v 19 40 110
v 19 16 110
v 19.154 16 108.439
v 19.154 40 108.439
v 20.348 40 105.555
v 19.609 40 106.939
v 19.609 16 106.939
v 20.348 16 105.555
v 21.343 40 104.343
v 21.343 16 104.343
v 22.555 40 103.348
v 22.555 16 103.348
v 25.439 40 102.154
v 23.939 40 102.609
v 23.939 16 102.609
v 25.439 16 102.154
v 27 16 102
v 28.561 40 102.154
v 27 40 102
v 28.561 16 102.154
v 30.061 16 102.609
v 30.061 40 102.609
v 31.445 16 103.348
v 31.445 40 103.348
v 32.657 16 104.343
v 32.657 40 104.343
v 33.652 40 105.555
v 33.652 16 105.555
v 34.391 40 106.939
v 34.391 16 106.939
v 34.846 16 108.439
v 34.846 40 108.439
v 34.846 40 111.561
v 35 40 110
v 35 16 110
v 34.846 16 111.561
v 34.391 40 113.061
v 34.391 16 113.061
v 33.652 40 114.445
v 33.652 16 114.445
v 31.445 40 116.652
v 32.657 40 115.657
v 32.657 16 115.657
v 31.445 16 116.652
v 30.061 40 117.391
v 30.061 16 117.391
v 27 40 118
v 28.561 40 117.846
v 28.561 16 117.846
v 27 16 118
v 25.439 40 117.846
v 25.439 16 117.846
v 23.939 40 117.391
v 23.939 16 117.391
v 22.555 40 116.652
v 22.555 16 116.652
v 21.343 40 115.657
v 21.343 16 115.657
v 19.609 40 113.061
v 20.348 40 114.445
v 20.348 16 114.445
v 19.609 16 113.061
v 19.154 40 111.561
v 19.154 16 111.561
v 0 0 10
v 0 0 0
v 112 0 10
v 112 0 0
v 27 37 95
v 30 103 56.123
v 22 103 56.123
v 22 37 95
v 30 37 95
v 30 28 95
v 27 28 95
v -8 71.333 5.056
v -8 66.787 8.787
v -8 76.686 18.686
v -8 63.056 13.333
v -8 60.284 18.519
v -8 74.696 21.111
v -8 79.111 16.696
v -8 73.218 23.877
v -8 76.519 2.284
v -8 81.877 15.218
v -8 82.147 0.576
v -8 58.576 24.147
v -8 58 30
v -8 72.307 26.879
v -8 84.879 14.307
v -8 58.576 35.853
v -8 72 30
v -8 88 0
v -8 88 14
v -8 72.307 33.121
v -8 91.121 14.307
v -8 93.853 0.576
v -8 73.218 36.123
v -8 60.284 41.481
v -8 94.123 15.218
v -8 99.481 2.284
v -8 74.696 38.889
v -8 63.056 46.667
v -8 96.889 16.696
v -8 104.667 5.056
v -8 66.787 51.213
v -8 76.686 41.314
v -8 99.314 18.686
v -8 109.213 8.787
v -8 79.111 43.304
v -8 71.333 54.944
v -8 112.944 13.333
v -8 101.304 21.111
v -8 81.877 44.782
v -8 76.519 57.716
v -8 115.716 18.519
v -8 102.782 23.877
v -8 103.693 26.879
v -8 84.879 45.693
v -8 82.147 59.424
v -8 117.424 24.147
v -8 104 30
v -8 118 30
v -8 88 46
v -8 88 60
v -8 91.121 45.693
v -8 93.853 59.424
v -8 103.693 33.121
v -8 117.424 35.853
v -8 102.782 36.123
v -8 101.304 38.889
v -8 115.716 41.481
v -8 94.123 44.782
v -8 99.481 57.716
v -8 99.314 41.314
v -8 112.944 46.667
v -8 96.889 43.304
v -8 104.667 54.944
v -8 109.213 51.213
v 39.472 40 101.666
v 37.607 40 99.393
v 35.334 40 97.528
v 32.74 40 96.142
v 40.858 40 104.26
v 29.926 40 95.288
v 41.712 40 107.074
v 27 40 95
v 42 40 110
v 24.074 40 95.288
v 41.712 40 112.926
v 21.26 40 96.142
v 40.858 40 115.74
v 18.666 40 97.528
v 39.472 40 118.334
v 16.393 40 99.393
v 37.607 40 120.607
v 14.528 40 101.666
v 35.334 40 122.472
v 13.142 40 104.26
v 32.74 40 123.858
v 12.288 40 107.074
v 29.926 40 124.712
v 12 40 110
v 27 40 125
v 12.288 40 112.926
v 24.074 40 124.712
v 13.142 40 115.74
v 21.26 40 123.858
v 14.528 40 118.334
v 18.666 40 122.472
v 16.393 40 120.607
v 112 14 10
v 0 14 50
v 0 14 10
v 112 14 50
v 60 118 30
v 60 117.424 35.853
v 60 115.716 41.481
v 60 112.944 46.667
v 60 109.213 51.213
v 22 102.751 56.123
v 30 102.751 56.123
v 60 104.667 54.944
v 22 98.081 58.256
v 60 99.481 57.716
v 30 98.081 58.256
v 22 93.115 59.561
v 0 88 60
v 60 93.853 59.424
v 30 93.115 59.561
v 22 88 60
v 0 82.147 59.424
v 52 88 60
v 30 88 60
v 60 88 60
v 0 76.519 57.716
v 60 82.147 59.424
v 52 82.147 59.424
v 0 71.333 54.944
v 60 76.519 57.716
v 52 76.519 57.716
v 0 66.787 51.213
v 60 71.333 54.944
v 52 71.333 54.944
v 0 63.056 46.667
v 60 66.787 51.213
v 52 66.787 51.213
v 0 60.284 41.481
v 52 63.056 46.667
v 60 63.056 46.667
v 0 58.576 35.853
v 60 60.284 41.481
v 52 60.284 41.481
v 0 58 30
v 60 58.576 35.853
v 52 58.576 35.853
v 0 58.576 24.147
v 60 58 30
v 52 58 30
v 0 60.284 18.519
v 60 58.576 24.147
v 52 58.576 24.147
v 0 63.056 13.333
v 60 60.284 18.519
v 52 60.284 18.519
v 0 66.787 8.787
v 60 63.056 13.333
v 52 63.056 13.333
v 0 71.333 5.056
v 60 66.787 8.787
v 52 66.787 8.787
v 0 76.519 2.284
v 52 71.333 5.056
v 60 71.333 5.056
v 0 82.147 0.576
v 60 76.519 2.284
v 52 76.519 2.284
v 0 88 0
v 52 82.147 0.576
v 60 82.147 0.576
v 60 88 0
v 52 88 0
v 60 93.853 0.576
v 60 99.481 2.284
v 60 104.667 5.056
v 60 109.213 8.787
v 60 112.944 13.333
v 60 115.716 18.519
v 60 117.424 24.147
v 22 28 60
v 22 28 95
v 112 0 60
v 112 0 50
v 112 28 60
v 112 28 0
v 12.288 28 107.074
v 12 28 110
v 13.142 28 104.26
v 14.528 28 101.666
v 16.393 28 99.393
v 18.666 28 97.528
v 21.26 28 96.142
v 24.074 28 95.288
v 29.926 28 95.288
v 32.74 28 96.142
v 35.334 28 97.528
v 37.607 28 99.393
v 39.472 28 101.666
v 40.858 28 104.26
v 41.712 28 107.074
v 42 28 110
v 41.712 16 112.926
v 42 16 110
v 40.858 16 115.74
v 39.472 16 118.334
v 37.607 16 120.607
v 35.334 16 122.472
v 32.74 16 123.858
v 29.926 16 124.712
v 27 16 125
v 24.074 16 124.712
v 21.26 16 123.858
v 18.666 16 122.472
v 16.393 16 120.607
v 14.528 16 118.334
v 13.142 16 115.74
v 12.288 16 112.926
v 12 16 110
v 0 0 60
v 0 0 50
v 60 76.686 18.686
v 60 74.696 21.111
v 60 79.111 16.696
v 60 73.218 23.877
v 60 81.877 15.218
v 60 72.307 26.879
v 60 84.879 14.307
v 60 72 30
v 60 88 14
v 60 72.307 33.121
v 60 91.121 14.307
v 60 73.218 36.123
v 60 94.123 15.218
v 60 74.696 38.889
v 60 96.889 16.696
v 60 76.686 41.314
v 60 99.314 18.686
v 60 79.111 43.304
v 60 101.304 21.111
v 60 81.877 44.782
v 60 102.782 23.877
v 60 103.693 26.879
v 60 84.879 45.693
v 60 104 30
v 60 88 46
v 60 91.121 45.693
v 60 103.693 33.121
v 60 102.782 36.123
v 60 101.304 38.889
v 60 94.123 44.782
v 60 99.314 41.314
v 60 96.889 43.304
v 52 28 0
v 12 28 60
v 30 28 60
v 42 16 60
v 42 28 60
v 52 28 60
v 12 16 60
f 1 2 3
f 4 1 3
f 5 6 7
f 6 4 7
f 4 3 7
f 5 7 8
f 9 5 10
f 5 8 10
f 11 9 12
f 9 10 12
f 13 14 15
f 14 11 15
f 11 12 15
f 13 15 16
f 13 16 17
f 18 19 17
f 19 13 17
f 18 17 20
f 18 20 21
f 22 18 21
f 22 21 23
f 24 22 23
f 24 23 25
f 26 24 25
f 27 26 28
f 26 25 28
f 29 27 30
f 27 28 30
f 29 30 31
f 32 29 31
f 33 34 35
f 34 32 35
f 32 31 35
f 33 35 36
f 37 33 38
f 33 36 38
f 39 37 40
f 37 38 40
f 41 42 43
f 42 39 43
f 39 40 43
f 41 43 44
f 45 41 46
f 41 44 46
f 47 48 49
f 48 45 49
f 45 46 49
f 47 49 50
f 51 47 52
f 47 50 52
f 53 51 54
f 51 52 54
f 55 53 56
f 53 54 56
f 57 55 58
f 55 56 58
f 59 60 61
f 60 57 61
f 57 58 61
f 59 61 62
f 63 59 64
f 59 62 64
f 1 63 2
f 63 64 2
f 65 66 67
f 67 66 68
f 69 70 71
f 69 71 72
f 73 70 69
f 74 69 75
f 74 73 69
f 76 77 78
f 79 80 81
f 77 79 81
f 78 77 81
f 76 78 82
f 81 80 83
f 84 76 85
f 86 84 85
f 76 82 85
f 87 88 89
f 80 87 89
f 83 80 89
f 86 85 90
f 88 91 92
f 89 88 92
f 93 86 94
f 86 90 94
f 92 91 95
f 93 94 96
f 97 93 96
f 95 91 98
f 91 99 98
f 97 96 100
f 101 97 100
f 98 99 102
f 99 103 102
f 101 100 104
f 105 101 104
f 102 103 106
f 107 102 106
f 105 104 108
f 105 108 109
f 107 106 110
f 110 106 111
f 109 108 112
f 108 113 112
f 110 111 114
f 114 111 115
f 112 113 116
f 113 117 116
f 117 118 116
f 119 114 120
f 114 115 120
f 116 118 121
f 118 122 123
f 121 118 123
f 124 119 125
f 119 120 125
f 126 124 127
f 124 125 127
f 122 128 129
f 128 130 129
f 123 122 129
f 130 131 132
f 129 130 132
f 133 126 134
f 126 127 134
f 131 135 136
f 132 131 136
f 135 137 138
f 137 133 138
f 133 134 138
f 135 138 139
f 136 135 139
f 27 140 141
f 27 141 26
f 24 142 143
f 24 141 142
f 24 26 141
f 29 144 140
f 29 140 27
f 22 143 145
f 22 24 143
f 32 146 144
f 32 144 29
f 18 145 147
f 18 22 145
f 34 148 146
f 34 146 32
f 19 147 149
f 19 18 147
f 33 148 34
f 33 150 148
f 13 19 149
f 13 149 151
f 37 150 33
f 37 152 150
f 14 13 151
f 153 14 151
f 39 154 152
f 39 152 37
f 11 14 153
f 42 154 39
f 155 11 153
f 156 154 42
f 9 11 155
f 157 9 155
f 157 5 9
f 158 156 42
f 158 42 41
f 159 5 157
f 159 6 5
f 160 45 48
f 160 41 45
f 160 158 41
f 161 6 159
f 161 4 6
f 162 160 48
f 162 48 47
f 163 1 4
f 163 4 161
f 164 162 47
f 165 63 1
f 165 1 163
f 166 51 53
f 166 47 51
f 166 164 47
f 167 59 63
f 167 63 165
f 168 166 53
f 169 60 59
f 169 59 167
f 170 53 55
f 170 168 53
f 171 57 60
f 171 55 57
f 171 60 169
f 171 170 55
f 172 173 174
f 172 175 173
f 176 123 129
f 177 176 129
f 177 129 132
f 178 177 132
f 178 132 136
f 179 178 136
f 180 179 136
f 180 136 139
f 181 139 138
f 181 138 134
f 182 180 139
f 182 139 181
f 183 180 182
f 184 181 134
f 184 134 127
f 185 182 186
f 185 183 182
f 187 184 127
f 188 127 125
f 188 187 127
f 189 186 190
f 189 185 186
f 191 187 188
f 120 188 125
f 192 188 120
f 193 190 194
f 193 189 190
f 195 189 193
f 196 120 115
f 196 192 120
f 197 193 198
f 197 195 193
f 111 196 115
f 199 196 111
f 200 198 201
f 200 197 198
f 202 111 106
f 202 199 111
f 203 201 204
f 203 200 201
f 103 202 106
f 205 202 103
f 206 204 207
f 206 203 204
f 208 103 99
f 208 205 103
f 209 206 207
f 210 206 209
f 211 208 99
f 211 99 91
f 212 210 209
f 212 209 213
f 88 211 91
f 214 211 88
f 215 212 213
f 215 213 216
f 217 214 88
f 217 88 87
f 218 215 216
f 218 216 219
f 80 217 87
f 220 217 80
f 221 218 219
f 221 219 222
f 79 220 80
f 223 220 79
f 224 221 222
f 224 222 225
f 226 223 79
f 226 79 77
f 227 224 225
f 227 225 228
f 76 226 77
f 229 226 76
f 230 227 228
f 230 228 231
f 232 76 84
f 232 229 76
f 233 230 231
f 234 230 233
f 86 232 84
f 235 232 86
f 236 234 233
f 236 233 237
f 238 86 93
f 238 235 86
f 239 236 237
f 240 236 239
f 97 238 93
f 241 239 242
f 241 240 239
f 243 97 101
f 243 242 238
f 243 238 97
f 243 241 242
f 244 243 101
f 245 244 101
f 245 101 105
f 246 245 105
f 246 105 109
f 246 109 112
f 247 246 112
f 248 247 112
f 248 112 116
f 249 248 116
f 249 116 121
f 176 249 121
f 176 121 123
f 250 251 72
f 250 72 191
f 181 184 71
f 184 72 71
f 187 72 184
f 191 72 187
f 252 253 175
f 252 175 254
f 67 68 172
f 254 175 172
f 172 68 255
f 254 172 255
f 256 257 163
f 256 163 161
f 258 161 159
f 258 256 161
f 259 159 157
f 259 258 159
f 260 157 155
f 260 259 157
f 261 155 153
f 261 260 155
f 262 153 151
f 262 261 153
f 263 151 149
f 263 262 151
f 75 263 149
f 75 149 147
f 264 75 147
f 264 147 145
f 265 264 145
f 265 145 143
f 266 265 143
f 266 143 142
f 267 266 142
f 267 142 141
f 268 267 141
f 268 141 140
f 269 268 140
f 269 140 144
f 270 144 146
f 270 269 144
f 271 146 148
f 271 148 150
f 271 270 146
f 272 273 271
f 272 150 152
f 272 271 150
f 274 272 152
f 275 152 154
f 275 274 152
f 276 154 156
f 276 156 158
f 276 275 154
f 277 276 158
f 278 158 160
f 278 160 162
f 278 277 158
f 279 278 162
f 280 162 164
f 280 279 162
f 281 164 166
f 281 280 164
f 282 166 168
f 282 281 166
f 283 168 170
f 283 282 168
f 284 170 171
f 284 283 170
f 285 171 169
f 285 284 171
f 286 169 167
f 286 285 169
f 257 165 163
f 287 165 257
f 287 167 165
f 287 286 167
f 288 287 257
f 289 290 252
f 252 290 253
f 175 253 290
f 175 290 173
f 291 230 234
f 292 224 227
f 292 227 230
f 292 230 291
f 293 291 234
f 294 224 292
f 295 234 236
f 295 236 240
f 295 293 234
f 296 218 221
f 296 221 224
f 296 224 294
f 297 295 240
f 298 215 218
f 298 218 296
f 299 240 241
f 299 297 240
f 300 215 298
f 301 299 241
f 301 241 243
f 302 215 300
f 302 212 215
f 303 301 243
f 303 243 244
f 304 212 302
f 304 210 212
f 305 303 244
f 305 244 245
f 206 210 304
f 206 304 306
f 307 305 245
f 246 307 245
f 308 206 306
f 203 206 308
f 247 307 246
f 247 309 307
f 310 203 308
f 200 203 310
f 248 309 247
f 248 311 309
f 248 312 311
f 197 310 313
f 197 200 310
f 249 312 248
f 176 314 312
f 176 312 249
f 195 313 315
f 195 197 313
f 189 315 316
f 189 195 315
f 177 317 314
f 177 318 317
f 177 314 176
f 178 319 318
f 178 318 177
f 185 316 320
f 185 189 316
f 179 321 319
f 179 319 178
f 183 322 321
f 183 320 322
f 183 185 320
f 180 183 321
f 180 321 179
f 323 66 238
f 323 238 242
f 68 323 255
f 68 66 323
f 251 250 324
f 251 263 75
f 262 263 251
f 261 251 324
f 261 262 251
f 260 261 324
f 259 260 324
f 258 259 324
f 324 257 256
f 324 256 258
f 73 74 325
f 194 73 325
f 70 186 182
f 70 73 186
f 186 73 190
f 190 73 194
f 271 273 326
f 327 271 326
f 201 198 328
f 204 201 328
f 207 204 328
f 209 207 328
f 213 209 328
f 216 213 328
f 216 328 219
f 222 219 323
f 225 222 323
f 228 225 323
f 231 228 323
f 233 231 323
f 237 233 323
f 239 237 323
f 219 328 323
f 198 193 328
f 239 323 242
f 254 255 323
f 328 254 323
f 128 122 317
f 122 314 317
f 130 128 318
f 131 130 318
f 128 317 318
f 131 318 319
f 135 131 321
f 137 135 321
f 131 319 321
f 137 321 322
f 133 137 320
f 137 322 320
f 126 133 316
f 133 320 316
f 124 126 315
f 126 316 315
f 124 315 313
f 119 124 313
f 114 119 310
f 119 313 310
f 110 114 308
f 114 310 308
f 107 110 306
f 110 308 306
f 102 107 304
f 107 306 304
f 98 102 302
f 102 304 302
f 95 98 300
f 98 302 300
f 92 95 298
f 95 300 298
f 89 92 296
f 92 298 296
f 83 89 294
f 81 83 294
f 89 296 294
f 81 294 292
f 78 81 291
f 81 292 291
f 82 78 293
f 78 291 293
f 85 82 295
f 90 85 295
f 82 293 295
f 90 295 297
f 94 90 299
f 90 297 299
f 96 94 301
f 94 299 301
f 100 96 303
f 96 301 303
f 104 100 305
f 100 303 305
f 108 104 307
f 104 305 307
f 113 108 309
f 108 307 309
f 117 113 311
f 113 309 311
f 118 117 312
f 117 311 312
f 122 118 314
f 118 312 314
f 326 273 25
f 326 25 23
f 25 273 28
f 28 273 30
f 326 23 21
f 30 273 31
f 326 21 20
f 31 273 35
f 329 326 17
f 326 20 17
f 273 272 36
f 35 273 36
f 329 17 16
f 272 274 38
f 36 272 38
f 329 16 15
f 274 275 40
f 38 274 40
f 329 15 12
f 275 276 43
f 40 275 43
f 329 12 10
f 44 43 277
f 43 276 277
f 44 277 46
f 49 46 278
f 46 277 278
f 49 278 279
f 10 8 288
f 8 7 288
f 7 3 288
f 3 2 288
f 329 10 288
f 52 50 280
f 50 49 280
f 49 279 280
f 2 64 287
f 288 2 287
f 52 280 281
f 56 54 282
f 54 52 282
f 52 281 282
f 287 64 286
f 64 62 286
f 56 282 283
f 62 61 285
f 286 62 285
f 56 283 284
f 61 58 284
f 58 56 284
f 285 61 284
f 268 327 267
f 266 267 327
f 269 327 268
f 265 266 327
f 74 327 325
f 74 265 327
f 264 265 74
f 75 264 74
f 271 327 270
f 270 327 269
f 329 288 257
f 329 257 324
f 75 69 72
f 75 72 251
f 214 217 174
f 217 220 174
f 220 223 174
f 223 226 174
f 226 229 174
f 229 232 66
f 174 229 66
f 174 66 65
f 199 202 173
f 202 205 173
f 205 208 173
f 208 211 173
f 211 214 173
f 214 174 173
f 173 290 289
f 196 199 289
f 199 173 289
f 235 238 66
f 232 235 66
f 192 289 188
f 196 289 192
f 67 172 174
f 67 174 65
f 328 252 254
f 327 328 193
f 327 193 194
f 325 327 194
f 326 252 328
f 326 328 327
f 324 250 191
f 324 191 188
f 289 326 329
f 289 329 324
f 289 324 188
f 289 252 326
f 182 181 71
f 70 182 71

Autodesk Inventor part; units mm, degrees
sketch "Skizze1" plane through (0, 0, 0) normal (0, 0, 1) x (1, 0, 0)
  line L0 (0, 0) -> (112, 0)
  line L1 (112, 0) -> (112, 28)
  line L2 (112, 28) -> (0, 28)
  line L3 (0, 28) -> (0, 0)
  dimension "d0" = 28
  dimension "d1" = 112
extrude "Extrusion1" add sketch "Skizze1" along normal blind 60
sketch "Skizze2" plane through (112, 0, 0) normal (1, 0, 0) x (0, 0, -1)
  line L0 (0, 0) -> (-60, 0) projected
  line L1 (-50, 0) -> (-50, 14)
  line L2 (-50, 14) -> (-10, 14)
  line L3 (-10, 14) -> (-10, 0)
  line L4 (-60, 0) -> (-60, 28) projected
  line L5 (0, 28) -> (-60, 28) projected
  point P0 (-10, 7)
  point P1 (-50, 7)
  point P2 (-30, 14)
  dimension "d4" = 40
  dimension "d5" = 10
  dimension "d6" = 14
extrude "Extrusion2" cut sketch "Skizze2" against normal up to surface (112 mm away)
sketch "Skizze3" plane through (0, 28, 0) normal (0, 1, 0) x (1, 0, 0)
  line L0 (112, -60) -> (0, -60) projected
  line L1 (0, 0) -> (112, 0) projected
  line L2 (0, -60) -> (52, -60)
  line L3 (52, -60) -> (52, 0)
  line L4 (52, 0) -> (0, 0)
  line L5 (0, 0) -> (0, -60)
  line L6 (112, 0) -> (112, -60) projected
  point P0 (52, -30)
  dimension "d9" = 60
extrude "Extrusion3" add sketch "Skizze3" along normal blind 60 contours L0 L5 L1 L3
ref_plane "Arbeitsebene1" through (60, 0, 0) normal (1, 0, 0) x (0, 1, 0)
sketch "Skizze7" plane through (60, 0, 0) normal (1, 0, 0) x (0, 1, 0)
  circle A0 centre (88, 30) radius 30
  circle A1 centre (88, 30) radius 16
  line L0 (28, 0) -> (28, 60) projected
  point P0 (0, 0)
  point P1 (28, 30)
  point P2 (28, 30)
  dimension "d25" = 60
  dimension "d26" = 32
  dimension "d27" = 60
extrude "Extrusion6" add sketch "Skizze7" against normal blind 68
extrude "Extrusion7" cut sketch "Skizze7" against normal blind 68 contours A1
ref_plane "Arbeitsebene2" through (0, 16, 0) normal (0, 1, 0) x (-1, 0, 0)
sketch "Skizze11" plane through (0, 16, 0) normal (0, 1, 0) x (-1, 0, 0)
  circle A0 centre (-27, 110) radius 15
  circle A1 centre (-27, 110) radius 8
  line L0 (-12, 110) -> (-12, 59.6136)
  line L1 (-42, 110) -> (-42, 59.6136)
  line L2 (-52, 60) -> (-52, 14) projected
  line L3 (0, 60) -> (-52, 60) projected
  point P0 (0, 0)
  point P1 (-52, 54)
  point P2 (-42, 60)
  point P3 (-12, 60)
  dimension "d42" = 30
  dimension "d43" = 16
  dimension "d44" = 10
  dimension "d45" = 50
extrude "Extrusion10" add sketch "Skizze11" along normal blind 24 contours A0
extrude "Extrusion11" add sketch "Skizze11" along normal blind 12 contours L0 L3 L1 A0
ref_plane "Arbeitsebene3" through (30, 0, 0) normal (1, 0, 0) x (0, 1, 0)
sketch "Skizze13" plane through (30, 0, 0) normal (1, 0, 0) x (0, 1, 0)
  line L0 (28, 95) -> (28, 110) projected
  line L1 (31, 56.123) -> (103, 56.123)
  line L2 (103, 56.123) -> (37, 95)
  line L3 (37, 95) -> (28, 95)
  line L4 (28, 95) -> (28, 56.123)
  line L5 (31, 56.123) -> (28, 56.123)
  line L6 (16, 110) -> (28, 110) projected
  line L7 (16, 110) -> (16, 110) projected
  line L8 (16, 110) -> (28, 110) projected
  line L9 (28, 110) -> (28, 110) projected
  line L10 (40, 95) -> (40, 125) projected
  line L11 (28, 95) -> (40, 95) projected
  point P0 (0, 0)
  point P1 (34, 95)
  dimension "d55" = 30.5
  dimension "d56" = 66
  dimension "d57" = 72
  dimension "d58" = 3
extrude "Extrusion12" add sketch "Skizze13" against normal blind 8
properties part number "Gary" material "Stahl, galvanisiert"
